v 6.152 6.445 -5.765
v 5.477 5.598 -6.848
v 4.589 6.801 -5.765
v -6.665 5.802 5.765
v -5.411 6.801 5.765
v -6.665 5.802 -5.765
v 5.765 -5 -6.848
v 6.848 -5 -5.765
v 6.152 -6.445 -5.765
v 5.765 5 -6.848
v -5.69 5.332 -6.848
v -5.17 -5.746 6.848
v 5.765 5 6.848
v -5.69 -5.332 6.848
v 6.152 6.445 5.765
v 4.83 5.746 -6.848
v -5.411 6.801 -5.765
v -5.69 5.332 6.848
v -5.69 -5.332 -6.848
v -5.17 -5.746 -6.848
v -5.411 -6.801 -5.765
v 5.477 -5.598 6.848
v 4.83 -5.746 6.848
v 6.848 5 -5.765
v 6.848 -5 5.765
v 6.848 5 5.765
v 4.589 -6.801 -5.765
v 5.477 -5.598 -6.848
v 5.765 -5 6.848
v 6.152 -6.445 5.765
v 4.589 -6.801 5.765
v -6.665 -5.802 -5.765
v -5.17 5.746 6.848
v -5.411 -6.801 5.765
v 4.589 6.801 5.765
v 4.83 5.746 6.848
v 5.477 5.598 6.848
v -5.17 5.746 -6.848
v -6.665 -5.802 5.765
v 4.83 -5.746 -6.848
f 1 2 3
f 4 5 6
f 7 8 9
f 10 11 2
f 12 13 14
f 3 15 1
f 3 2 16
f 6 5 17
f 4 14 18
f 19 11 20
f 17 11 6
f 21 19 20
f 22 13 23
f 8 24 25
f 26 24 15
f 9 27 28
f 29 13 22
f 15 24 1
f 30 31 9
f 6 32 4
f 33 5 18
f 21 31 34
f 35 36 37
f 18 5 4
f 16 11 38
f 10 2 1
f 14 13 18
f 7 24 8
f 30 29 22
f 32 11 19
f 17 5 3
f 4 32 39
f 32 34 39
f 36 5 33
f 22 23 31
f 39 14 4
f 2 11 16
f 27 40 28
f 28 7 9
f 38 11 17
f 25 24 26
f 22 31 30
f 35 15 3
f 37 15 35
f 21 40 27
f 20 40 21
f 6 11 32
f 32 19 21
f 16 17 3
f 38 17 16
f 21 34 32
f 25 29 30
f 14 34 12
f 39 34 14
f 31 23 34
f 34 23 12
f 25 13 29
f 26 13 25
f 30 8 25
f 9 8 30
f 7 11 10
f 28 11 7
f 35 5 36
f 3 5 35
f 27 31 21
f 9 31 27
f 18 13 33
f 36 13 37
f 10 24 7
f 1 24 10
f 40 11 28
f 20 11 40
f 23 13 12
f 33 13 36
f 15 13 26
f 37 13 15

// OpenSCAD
// Volume: 2417.3448095654862, SurfaceArea: 996.1467725031257
// Test minkowski - native Manifold.minkowskiSum
minkowski() {
    cube([10, 10, 10], center=true);
    sphere(r=2);
}
